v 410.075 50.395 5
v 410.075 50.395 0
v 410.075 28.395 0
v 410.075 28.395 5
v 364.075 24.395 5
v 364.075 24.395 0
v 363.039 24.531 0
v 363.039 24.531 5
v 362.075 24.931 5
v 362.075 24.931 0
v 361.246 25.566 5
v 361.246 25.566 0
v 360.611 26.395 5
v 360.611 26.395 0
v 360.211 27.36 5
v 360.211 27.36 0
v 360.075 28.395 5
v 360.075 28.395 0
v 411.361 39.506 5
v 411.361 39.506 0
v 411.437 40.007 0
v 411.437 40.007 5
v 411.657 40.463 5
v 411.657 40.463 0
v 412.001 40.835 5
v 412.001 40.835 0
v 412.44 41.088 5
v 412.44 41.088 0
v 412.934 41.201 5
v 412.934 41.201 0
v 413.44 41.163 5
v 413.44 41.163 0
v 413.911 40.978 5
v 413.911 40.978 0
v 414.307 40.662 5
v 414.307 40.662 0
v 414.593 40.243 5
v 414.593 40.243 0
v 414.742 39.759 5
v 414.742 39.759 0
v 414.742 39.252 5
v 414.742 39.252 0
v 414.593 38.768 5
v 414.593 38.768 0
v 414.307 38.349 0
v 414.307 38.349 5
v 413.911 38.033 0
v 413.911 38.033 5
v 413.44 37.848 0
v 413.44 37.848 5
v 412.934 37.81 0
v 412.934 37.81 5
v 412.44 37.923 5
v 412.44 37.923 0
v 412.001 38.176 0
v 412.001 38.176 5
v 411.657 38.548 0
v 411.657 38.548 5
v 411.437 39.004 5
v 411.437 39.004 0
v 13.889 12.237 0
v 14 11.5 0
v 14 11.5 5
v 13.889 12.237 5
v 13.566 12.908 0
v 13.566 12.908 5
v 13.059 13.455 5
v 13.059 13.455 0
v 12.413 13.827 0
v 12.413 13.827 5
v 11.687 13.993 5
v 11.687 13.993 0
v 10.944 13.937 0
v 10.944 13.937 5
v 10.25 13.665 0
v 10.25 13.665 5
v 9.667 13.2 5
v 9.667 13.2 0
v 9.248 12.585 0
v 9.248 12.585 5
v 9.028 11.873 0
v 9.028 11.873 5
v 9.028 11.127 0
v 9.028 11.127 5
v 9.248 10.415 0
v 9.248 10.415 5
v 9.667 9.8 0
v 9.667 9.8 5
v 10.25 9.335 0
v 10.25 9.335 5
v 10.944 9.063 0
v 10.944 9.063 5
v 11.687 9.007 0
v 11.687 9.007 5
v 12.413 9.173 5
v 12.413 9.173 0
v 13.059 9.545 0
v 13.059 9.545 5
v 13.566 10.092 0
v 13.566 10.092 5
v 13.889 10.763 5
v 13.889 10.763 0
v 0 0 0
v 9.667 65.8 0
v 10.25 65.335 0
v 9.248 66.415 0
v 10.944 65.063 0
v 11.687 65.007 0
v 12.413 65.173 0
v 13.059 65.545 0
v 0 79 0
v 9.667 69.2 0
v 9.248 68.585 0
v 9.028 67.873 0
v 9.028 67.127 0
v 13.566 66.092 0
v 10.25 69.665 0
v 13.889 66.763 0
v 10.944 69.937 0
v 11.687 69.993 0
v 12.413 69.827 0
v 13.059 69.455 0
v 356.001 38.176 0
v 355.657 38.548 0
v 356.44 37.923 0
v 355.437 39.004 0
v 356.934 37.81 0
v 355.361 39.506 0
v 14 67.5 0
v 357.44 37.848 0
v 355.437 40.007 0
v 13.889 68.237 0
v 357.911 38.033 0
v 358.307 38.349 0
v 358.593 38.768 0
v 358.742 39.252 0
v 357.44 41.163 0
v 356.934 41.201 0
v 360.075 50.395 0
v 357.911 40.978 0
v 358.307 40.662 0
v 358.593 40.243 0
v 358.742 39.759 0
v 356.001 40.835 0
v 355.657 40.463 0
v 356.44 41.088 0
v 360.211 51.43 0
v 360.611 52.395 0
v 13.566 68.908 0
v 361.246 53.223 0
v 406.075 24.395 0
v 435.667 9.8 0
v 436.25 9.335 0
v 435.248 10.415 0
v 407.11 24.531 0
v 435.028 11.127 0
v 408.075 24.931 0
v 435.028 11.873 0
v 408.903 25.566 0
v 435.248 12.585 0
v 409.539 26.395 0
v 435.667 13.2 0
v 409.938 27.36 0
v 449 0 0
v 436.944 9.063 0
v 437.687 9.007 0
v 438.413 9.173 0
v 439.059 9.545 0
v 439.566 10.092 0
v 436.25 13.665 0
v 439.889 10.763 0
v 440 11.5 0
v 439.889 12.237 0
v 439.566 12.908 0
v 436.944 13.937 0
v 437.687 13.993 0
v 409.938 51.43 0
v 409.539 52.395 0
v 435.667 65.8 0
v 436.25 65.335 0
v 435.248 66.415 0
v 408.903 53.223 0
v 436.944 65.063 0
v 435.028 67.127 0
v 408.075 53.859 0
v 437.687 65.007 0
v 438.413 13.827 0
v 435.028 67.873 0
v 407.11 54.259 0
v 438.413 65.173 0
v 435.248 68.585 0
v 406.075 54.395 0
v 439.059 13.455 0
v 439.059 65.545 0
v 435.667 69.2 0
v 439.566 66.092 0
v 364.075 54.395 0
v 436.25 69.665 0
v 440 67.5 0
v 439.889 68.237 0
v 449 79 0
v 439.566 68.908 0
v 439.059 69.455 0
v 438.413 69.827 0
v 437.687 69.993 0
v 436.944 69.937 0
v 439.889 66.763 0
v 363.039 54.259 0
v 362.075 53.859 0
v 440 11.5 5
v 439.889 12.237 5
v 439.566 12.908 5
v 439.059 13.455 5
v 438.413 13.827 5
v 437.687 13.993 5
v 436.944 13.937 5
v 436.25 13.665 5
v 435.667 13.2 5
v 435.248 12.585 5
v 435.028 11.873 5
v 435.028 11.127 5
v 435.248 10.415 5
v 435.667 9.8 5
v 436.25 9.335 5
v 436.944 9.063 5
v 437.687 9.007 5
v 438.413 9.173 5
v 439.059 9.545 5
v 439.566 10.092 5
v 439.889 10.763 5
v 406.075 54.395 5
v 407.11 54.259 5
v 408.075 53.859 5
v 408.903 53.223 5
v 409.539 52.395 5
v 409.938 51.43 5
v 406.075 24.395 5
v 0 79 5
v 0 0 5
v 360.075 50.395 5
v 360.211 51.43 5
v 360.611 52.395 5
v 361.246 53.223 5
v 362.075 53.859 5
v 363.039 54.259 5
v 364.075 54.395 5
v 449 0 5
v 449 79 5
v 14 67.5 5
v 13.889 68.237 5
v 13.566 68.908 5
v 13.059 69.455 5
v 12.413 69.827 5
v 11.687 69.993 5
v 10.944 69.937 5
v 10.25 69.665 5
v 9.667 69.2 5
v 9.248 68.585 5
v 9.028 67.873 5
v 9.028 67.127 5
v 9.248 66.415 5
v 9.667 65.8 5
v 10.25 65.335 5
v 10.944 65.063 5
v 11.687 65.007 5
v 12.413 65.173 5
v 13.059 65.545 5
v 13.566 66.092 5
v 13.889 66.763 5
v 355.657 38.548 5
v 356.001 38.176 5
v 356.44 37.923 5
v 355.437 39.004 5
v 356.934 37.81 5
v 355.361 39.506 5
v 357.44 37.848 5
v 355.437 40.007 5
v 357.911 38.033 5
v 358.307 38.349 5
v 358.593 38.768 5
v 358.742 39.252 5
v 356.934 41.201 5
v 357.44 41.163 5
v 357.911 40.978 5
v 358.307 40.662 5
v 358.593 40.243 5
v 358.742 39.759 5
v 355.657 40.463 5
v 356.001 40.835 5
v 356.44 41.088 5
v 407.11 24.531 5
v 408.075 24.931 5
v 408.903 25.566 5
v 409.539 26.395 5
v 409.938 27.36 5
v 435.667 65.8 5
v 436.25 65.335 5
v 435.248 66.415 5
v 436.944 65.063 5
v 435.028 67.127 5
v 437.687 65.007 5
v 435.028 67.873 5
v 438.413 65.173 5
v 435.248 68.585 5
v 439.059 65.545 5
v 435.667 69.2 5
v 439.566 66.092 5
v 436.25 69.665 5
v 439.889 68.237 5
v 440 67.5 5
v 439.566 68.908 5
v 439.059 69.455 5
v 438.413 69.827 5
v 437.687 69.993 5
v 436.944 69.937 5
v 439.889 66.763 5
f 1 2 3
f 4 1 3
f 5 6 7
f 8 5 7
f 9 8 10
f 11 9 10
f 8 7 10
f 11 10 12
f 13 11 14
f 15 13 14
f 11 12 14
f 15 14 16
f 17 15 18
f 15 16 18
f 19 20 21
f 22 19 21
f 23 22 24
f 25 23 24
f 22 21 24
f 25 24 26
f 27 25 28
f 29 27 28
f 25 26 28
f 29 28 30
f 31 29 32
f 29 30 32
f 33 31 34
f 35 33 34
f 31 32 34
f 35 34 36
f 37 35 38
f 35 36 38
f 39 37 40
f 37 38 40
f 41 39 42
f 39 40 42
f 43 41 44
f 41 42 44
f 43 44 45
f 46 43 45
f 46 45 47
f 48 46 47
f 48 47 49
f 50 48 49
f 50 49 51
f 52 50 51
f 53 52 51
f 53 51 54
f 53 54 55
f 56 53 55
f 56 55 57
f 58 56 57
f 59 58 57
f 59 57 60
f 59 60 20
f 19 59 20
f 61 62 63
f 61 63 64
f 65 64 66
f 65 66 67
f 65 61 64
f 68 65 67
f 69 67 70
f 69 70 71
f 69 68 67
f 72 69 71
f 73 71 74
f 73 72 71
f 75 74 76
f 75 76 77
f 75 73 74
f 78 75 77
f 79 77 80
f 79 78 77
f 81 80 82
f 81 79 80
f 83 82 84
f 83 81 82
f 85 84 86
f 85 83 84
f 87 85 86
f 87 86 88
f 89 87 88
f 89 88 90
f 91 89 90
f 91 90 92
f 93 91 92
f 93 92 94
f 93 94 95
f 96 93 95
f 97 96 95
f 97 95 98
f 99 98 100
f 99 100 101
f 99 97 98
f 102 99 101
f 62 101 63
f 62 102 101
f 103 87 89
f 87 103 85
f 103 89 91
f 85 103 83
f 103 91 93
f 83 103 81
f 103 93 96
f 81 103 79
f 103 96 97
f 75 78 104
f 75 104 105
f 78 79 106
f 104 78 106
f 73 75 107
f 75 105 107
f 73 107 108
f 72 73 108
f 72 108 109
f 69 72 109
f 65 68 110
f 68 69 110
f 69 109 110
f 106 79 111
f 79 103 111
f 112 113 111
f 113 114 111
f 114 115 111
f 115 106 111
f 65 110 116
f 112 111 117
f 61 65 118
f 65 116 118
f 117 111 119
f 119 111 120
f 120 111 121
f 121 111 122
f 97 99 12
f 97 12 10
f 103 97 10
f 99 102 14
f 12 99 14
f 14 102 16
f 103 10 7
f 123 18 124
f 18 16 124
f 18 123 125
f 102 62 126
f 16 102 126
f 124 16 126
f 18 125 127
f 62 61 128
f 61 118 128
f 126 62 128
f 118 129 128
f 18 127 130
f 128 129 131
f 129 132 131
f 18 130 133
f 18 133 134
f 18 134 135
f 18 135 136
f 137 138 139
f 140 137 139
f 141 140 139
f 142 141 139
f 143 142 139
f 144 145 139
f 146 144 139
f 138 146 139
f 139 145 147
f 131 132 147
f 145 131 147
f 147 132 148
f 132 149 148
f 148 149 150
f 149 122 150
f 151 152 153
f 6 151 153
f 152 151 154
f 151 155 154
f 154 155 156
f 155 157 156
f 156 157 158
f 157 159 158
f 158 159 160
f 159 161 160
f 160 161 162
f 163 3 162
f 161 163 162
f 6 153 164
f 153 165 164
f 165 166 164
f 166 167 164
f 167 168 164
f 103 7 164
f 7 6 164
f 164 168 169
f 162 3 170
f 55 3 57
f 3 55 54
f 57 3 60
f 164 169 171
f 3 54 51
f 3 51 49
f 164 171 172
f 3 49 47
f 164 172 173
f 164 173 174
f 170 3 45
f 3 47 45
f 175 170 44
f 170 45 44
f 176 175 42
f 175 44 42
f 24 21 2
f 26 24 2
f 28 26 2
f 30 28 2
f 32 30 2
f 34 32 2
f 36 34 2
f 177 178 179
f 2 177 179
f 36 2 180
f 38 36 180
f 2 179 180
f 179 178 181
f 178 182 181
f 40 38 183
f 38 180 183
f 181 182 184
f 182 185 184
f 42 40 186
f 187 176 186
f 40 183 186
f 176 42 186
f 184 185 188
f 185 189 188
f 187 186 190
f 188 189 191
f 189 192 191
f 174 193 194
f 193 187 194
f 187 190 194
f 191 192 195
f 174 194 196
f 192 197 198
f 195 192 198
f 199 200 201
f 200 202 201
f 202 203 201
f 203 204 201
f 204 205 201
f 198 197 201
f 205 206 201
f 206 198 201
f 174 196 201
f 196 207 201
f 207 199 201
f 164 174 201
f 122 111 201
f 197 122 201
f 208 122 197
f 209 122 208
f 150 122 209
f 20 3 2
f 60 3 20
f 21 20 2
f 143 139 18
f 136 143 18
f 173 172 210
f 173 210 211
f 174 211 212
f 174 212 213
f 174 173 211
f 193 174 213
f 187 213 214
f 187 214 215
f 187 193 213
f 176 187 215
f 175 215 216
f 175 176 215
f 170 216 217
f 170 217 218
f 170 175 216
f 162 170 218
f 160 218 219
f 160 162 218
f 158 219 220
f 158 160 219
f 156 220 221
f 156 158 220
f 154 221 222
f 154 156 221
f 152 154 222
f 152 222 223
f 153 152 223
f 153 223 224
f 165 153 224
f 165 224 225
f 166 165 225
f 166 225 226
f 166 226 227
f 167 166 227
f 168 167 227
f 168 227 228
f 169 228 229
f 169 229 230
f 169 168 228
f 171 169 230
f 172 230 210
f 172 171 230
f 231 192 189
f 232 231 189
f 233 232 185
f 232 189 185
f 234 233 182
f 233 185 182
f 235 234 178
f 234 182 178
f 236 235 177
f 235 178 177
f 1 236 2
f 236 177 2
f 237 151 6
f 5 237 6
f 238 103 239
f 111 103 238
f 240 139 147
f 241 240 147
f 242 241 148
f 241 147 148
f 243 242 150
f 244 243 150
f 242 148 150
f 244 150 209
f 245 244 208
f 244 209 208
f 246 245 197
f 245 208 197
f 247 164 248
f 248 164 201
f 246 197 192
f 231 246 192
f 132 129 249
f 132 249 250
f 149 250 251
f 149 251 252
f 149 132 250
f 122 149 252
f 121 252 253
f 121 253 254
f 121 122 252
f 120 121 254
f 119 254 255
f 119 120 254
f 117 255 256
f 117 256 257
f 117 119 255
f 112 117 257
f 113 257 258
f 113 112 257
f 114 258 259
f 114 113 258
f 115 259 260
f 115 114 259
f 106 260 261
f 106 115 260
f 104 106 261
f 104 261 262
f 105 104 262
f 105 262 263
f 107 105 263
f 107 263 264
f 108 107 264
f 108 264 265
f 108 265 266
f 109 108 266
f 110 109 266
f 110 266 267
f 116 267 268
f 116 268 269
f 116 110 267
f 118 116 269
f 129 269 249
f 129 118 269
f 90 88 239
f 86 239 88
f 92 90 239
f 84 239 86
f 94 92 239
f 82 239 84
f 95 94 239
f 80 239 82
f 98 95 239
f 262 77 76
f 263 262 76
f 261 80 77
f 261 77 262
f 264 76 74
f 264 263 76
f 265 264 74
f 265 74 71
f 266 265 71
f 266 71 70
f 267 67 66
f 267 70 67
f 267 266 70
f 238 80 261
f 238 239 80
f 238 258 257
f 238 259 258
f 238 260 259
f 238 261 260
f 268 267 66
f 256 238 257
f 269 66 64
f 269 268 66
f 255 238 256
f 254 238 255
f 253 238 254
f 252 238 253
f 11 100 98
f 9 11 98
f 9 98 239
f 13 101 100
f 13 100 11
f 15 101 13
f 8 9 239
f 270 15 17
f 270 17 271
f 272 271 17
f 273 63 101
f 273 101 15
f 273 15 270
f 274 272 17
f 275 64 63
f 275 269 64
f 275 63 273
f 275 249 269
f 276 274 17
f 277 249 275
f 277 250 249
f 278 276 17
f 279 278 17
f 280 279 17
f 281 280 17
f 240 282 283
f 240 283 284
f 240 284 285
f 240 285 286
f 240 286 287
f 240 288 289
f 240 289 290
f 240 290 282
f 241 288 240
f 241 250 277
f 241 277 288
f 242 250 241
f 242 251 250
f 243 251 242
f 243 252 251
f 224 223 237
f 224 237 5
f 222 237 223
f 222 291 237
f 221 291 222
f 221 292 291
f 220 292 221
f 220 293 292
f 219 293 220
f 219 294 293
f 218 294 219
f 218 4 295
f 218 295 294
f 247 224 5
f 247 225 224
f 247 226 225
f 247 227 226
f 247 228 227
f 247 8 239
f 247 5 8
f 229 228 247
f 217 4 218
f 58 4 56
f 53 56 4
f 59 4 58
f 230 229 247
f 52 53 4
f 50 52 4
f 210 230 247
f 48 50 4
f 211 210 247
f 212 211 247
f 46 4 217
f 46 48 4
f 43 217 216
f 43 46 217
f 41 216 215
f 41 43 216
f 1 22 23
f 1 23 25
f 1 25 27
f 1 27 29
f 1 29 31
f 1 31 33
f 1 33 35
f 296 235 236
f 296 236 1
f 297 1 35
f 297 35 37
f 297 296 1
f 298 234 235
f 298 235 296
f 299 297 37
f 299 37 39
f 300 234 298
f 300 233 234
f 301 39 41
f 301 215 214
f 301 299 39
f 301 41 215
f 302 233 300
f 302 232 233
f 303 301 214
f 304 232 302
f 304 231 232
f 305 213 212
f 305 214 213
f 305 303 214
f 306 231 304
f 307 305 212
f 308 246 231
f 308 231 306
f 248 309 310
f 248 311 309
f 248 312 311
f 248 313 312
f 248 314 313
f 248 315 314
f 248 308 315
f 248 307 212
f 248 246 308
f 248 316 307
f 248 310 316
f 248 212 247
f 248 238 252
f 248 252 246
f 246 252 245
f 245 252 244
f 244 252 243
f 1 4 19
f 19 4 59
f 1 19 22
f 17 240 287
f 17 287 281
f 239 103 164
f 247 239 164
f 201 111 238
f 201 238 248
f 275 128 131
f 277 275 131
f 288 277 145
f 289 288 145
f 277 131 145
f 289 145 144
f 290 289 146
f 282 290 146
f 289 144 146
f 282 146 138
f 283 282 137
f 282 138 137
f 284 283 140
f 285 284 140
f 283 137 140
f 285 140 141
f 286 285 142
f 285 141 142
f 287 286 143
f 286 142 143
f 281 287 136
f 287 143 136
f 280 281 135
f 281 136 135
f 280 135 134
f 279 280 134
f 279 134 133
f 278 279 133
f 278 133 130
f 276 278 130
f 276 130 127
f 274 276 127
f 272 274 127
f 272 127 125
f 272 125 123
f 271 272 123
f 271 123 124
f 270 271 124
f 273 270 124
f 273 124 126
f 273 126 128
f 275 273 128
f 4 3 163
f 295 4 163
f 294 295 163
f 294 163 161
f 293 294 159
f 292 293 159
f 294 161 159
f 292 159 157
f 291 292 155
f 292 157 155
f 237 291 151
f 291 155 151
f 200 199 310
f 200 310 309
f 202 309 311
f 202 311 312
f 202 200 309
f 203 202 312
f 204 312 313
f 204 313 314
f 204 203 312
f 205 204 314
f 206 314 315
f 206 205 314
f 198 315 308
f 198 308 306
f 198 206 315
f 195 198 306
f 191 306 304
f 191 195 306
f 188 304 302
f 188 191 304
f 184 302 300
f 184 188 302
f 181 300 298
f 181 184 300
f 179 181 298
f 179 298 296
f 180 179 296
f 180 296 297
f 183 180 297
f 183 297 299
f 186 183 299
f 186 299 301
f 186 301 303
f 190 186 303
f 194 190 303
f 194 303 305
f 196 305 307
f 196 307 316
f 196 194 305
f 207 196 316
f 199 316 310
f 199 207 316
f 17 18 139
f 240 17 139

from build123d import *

# Parameters (mm, degrees)
SKETCH_F_W                   = 449
SKETCH_F_H                   = 79
SKETCH_F_R                   = 2.5
ESTRUSIONE_ESTRUSIONE1_DEPTH = 5
SKETCH1_R                    = 1.7
EXTRUDE1_DEPTH               = 6


with BuildPart() as part:
    # Sketch f → Estrusione-Estrusione1 (new body)
    with BuildSketch(Plane.XY):
        with Locations((224.5, 39.5)):
            Rectangle(SKETCH_F_W, SKETCH_F_H)
        with Locations((11.5, 67.5)):
            Circle(SKETCH_F_R, mode=Mode.SUBTRACT)
        with Locations((437.5, 67.5)):
            Circle(SKETCH_F_R, mode=Mode.SUBTRACT)
        with Locations((11.5, 11.5)):
            Circle(SKETCH_F_R, mode=Mode.SUBTRACT)
        with Locations((437.5, 11.5)):
            Circle(SKETCH_F_R, mode=Mode.SUBTRACT)
    extrude(amount=ESTRUSIONE_ESTRUSIONE1_DEPTH)

    # Sketch1 → Extrude1 (cut, through all)
    with BuildSketch(Plane(origin=(0, 0, 0), x_dir=(-1, 0, 0), z_dir=(0, 0, -1))):
        with Locations((-413.061242298, 39.505506417)):
            Circle(SKETCH1_R)
        with Locations((-357.061242298, 39.505506417)):
            Circle(SKETCH1_R)
        with BuildLine():
            Line((-364.0746338, 54.394920259), (-406.0746338, 54.394920259))
            ThreePointArc((-406.0746338, 54.394920259), (-408.903060925, 53.223347384), (-410.0746338, 50.394920259))
            Line((-410.0746338, 50.394920259), (-410.0746338, 28.394920259))
            ThreePointArc((-410.0746338, 28.394920259), (-408.903060925, 25.566493134), (-406.0746338, 24.394920259))
            Line((-406.0746338, 24.394920259), (-364.0746338, 24.394920259))
            ThreePointArc((-364.0746338, 24.394920259), (-361.246206675, 25.566493134), (-360.0746338, 28.394920259))
            Line((-360.0746338, 28.394920259), (-360.0746338, 50.394920259))
            ThreePointArc((-360.0746338, 50.394920259), (-361.246206675, 53.223347384), (-364.0746338, 54.394920259))
        make_face()
    extrude(amount=-EXTRUDE1_DEPTH, mode=Mode.SUBTRACT)


solid = part.part
